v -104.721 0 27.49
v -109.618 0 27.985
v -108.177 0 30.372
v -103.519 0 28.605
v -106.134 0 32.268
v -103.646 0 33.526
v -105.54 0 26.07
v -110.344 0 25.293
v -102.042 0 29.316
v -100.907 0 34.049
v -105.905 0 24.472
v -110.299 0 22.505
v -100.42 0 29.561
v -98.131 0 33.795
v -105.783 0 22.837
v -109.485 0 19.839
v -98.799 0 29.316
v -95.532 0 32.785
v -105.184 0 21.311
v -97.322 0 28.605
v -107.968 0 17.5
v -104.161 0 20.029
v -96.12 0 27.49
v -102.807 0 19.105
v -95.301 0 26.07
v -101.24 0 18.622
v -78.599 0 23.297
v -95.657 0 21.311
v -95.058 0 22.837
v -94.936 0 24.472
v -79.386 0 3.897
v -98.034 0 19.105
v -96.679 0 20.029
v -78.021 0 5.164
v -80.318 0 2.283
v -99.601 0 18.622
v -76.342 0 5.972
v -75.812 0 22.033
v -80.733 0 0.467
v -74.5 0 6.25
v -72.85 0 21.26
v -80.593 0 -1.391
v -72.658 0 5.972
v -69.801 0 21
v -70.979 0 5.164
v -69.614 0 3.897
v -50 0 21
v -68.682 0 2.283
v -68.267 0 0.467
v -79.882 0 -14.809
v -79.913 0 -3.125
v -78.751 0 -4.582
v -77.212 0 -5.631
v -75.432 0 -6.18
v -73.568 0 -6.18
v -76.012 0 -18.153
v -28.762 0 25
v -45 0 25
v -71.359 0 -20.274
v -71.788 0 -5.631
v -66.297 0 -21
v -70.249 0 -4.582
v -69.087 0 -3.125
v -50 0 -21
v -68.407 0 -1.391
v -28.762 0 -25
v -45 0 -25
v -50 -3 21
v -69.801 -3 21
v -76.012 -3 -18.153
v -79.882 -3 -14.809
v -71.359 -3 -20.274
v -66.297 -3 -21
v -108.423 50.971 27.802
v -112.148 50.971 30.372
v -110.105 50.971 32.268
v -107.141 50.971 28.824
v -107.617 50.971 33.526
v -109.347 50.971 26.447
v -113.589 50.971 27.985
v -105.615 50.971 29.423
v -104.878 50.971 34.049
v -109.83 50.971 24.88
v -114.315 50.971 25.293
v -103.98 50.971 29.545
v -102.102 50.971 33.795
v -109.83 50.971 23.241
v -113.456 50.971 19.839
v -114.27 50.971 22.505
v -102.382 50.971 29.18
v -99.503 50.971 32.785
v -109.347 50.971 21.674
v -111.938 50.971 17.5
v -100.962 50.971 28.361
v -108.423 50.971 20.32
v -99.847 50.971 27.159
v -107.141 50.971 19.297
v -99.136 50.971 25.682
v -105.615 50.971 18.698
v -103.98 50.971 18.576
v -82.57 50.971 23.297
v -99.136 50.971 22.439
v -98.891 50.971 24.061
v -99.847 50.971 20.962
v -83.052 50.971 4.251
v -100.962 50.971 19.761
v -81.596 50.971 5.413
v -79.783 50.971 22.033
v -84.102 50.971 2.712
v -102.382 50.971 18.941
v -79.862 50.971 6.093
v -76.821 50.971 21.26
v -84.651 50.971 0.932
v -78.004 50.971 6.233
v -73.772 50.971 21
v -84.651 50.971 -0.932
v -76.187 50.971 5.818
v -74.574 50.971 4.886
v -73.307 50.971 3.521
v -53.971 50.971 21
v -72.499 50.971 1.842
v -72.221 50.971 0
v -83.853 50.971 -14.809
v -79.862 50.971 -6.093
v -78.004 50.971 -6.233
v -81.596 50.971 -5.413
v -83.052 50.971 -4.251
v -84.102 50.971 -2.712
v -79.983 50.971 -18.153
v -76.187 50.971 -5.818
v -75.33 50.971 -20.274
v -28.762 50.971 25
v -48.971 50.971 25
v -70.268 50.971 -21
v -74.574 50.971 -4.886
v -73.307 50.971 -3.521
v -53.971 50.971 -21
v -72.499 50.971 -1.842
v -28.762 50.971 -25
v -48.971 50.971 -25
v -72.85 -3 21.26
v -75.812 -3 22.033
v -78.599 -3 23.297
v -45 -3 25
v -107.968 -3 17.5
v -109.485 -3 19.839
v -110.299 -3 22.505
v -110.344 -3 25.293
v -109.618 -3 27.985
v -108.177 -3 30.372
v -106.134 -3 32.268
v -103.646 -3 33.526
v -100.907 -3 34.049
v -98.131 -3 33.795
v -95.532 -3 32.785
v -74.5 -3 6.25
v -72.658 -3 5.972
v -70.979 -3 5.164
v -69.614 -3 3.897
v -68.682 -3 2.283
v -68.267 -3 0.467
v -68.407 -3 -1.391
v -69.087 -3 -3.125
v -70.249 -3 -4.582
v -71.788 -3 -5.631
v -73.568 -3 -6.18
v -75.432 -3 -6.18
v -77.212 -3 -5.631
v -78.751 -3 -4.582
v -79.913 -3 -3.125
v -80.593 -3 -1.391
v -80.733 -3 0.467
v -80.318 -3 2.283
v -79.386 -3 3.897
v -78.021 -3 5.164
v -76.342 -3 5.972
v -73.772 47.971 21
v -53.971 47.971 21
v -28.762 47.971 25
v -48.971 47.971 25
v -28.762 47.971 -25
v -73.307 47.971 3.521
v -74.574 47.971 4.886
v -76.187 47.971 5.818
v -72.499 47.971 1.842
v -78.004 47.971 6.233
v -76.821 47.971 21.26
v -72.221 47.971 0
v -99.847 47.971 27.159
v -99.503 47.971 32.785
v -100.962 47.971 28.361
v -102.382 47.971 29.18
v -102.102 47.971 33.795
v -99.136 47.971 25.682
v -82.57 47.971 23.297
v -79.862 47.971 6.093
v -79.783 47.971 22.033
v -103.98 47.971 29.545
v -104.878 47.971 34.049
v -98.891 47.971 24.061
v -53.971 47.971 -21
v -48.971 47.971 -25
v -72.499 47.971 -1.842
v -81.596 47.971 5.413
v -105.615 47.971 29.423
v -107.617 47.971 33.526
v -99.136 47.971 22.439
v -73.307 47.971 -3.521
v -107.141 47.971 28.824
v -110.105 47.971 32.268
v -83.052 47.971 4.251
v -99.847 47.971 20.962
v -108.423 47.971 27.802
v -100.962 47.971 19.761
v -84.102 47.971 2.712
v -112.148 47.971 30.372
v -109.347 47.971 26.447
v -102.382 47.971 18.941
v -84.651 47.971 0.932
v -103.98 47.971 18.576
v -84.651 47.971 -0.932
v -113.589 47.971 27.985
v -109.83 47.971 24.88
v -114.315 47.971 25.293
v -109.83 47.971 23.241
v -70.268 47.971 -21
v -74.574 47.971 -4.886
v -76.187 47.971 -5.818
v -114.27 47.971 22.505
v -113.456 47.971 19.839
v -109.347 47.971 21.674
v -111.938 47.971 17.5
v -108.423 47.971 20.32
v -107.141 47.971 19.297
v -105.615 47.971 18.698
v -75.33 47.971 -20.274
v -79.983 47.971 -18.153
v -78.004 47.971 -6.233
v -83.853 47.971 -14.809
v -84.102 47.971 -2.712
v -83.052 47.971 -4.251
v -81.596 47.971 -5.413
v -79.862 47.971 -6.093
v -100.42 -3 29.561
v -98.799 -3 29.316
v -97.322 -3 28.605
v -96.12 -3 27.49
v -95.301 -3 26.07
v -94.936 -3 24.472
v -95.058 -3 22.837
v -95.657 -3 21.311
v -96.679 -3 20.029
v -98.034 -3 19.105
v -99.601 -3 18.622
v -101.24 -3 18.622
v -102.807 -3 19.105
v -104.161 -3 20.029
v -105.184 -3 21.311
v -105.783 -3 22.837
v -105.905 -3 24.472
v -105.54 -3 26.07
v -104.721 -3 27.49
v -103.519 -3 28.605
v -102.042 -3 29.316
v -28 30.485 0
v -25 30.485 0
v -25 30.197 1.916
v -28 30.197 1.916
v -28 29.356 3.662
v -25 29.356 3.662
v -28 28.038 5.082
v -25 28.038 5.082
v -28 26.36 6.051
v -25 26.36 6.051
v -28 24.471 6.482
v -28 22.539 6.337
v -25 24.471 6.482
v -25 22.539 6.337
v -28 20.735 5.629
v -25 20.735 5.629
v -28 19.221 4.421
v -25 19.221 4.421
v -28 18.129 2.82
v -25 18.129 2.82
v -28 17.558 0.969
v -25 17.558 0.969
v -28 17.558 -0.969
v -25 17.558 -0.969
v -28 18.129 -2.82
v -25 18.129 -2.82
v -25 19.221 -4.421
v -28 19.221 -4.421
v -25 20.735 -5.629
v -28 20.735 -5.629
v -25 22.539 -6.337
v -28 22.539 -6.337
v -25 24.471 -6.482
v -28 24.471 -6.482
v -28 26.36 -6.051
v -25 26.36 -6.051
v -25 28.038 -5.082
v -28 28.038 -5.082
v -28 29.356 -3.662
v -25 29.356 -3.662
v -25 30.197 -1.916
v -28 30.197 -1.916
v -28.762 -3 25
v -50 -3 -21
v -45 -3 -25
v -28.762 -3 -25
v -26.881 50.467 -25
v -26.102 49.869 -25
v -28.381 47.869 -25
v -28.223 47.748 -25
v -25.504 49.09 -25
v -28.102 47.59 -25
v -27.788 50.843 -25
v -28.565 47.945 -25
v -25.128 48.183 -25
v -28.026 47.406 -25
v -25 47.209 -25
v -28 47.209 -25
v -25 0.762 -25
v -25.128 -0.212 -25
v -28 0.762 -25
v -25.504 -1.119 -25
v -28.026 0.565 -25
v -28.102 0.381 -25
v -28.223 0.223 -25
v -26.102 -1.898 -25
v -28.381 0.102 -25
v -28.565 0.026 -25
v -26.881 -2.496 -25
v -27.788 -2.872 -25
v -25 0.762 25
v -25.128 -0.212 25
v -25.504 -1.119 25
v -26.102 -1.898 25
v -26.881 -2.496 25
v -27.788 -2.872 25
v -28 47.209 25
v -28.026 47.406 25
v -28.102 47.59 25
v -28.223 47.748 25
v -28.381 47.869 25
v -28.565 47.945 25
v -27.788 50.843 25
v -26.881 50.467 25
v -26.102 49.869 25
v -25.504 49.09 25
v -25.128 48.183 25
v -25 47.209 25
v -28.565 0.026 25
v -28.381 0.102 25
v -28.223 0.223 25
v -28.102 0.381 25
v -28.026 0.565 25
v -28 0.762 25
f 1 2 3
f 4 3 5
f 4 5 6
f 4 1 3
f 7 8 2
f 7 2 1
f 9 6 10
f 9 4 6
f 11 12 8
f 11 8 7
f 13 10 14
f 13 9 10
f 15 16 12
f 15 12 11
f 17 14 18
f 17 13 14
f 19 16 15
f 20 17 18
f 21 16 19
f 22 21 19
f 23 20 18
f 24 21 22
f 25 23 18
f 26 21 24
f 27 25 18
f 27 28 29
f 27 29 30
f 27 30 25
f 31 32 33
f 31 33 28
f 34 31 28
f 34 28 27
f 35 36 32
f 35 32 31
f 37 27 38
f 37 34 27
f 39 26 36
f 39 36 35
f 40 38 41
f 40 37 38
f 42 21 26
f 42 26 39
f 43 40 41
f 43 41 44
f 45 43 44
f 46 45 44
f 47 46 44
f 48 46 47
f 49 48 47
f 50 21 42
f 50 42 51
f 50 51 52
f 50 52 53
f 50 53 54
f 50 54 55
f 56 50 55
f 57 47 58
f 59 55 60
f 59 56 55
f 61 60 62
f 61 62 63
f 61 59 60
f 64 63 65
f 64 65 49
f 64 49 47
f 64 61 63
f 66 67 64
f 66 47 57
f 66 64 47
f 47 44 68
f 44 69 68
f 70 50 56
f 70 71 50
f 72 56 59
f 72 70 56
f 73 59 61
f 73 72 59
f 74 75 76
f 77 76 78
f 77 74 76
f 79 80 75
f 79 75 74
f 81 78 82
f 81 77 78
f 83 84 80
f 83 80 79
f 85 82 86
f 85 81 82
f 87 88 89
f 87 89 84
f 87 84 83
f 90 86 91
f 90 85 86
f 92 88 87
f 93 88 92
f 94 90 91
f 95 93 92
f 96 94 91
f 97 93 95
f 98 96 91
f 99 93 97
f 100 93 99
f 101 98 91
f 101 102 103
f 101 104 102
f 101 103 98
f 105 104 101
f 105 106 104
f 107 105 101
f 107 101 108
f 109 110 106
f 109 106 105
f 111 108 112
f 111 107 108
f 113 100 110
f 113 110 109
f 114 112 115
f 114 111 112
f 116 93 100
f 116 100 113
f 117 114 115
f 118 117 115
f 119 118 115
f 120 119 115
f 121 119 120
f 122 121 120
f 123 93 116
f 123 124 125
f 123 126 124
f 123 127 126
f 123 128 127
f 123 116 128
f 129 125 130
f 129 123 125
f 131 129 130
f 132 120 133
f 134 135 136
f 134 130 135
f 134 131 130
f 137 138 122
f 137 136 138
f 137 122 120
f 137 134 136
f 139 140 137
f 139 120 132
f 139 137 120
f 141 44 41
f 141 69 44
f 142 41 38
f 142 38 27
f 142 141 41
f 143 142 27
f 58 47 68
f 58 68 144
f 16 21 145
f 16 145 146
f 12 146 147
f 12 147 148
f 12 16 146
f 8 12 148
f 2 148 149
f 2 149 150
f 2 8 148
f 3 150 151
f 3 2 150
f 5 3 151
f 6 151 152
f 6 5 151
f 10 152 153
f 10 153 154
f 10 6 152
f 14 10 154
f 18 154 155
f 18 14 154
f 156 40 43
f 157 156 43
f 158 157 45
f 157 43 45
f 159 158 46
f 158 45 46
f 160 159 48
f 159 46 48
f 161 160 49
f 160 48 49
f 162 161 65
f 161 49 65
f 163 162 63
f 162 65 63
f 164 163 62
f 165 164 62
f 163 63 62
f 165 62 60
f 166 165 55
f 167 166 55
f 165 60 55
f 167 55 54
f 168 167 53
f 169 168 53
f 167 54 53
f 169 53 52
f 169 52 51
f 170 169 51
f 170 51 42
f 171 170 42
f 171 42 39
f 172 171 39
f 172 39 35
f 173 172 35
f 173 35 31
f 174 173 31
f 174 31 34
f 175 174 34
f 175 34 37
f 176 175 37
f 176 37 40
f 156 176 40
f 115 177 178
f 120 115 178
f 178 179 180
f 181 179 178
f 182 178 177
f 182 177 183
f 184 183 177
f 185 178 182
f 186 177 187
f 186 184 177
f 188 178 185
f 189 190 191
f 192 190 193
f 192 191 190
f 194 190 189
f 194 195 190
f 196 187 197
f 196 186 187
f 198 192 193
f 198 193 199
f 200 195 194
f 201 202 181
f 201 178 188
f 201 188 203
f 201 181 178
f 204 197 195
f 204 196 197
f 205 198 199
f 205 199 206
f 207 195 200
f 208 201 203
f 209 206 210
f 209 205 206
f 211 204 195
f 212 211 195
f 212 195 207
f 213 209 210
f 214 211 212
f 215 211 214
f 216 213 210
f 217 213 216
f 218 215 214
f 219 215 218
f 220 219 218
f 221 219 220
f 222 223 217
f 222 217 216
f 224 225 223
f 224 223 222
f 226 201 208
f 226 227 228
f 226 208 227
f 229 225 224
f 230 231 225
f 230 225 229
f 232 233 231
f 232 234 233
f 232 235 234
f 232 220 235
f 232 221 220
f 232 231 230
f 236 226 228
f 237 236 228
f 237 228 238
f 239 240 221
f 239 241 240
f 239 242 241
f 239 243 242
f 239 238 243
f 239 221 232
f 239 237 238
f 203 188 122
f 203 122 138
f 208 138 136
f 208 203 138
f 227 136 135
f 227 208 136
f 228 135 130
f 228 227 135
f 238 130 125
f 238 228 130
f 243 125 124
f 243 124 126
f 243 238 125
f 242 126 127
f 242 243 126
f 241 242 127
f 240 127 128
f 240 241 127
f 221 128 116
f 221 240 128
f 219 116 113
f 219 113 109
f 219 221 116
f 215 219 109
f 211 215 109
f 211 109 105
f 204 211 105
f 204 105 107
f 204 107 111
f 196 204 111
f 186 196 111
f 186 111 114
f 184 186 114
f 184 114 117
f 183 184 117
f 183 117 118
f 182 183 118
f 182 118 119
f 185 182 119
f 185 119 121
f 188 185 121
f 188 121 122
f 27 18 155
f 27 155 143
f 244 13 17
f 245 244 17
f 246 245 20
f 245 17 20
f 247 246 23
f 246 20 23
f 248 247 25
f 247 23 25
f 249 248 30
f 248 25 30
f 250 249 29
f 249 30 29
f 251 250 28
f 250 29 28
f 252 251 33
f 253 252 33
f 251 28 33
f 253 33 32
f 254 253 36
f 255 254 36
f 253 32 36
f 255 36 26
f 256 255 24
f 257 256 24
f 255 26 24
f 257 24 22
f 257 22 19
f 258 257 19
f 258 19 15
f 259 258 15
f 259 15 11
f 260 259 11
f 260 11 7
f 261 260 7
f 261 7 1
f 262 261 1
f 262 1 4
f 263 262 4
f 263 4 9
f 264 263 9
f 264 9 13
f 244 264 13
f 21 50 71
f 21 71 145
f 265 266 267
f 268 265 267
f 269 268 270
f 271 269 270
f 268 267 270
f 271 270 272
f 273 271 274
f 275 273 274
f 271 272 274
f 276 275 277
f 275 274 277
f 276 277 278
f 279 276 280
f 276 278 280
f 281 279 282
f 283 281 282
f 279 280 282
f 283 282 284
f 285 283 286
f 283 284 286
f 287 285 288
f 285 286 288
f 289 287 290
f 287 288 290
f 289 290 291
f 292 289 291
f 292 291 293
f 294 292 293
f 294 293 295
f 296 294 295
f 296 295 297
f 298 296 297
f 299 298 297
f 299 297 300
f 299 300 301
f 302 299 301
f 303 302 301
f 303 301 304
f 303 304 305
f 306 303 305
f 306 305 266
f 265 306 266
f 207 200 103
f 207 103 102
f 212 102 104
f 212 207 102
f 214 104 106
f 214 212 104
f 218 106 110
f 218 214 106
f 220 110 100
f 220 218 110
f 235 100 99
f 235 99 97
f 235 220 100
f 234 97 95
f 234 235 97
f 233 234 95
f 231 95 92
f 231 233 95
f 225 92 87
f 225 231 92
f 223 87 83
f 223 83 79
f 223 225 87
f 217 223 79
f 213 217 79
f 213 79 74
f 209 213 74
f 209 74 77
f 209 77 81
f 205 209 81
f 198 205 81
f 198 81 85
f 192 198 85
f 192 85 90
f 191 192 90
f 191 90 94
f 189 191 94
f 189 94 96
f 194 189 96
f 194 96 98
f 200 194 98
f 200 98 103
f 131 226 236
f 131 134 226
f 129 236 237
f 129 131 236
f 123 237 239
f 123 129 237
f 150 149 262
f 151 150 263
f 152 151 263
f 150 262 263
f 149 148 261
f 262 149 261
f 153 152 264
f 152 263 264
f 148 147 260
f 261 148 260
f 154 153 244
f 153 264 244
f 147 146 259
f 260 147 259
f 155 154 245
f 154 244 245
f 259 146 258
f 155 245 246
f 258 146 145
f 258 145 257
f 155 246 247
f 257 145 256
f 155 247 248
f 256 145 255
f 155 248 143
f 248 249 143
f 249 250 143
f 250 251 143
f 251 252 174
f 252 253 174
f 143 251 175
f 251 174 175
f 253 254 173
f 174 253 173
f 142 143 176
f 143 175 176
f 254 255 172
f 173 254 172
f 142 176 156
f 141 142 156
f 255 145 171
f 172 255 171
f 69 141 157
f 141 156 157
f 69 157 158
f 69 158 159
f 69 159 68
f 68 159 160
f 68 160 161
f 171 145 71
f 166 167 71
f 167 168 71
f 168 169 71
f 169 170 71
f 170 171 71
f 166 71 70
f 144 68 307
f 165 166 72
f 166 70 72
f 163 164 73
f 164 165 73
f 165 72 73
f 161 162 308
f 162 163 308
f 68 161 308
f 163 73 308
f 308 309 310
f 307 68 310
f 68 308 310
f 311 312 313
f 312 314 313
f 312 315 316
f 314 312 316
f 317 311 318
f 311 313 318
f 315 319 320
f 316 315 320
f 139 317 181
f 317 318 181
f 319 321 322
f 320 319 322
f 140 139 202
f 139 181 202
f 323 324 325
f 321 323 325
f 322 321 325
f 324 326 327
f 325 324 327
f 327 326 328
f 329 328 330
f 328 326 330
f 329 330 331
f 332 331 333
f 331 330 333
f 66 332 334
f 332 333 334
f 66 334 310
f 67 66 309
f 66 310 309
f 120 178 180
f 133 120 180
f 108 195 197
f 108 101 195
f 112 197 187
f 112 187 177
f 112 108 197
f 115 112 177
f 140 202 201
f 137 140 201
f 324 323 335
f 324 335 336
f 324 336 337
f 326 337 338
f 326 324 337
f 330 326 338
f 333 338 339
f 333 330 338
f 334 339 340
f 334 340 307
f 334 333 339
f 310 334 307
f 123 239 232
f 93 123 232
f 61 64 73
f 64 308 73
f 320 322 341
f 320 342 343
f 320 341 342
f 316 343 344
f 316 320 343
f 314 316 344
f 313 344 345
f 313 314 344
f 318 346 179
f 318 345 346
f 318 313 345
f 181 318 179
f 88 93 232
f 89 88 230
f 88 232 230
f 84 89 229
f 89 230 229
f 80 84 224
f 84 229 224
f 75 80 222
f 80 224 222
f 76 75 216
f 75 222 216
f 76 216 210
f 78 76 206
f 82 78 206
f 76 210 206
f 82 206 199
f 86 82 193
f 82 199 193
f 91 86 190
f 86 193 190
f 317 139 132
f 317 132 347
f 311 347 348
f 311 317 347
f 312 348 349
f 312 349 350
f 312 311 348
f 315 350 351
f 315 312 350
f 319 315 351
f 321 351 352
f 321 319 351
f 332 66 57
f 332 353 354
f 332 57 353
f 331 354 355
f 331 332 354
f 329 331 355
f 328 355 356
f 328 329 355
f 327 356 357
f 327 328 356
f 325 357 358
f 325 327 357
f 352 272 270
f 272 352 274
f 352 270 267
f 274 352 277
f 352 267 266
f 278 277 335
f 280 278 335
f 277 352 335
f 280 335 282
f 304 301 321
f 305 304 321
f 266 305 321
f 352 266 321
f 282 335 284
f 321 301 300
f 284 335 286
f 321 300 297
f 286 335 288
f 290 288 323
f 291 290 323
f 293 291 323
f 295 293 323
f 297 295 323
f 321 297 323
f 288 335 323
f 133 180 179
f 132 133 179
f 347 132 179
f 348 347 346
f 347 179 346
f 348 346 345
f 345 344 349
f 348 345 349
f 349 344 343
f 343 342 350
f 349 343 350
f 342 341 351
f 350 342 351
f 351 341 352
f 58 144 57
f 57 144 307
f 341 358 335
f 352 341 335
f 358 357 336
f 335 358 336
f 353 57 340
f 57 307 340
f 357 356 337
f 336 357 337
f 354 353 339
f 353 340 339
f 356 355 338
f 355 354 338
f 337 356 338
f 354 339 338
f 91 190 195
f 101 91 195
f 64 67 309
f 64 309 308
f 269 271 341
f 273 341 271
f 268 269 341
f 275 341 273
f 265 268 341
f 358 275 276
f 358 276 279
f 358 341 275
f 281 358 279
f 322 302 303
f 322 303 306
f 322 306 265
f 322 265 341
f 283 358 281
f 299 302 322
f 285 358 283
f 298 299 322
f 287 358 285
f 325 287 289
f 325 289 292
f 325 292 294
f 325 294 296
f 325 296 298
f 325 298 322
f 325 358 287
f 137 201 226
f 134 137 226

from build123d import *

# Parameters (mm, degrees)
SKETCH1_R                    = 5.5
SKETCH1_R_2                  = 6.25
BASE_FLANGE1_DEPTH           = 3
SKETCHED_START               = -3
SKETCHED_BEND1_OUTLINE_R     = 5.5
SKETCHED_BEND1_OUTLINE_R_2   = 6.25
SKETCHED_BEND1_DEPTH         = 3
SKETCHED_START_2             = 0.762
SKETCHED_BEND1_2_OUTLINE_W   = 3
SKETCHED_BEND1_2_OUTLINE_H   = 50
SKETCHED_BEND1_2_DEPTH       = 46.446858709
SKETCHED_START_3             = 47.208858709
SKETCHED_BEND1_3_OUTLINE_R   = 5.5
SKETCHED_BEND1_3_OUTLINE_R_2 = 6.25
SKETCHED_BEND1_3_DEPTH       = 3.762
SKETCHED_BEND1_4_OUTLINE_R   = 5.5
SKETCHED_BEND1_4_OUTLINE_R_2 = 6.25
SKETCHED_BEND1_4_DEPTH       = 0.762
SKETCHED_START_4             = -26
SKETCHED_BEND1_5_DEPTH       = 61
FILLET1_R                    = 18
SKETCH7_R                    = 6.5
CUT_EXTRUDE1_DEPTH           = 10


with BuildPart() as part:
    # Base-Flange1: sheet metal written as solids
    # Sketch1 → Base-Flange1 (new body)
    with BuildSketch(Plane(origin=(0, 0, 0), x_dir=(1, 0, 0), z_dir=(0, 1, 0))):
        with BuildLine():
            Line((45, 25), (-45, 25))
            Line((-45, 25), (-50, 21))
            Line((-50, 21), (-74.5, 21))
            Line((-74.5, 21), (-107.967539406, -17.5))
            ThreePointArc((-107.967539406, -17.5), (-108.177491125, -30.371550102), (-95.532395294, -32.784521956))
            Line((-95.532395294, -32.784521956), (-74.5, -21))
            Line((-74.5, -21), (-50, -21))
            Line((-50, -21), (-45, -25))
            Line((-45, -25), (45, -25))
            Line((45, -25), (50, -21))
            Line((50, -21), (74.5, -21))
            Line((74.5, -21), (95.532395294, -32.784521956))
            ThreePointArc((95.532395294, -32.784521956), (108.177491125, -30.371550102), (107.967539406, -17.5))
            Line((107.967539406, -17.5), (74.5, 21))
            Line((74.5, 21), (50, 21))
            Line((50, 21), (45, 25))
        make_face()
        with Locations(Location((-100.420443604, -24.06059029, 0), (0, 0, 270))):
            Circle(SKETCH1_R, mode=Mode.SUBTRACT)
        with Locations(Location((-74.5, 0, 0), (0, 0, 270))):
            Circle(SKETCH1_R_2, mode=Mode.SUBTRACT)
        with Locations(Location((74.5, 0, 0), (0, 0, 90))):
            Circle(SKETCH1_R_2, mode=Mode.SUBTRACT)
        with Locations(Location((100.420443604, -24.06059029, 0), (0, 0, 90))):
            Circle(SKETCH1_R, mode=Mode.SUBTRACT)
    extrude(amount=-BASE_FLANGE1_DEPTH)

    # Sketched Bend1: read off the stored shape, not the designer's step
    # Sketched Bend1 outline → Sketched Bend1 (cut)
    with BuildSketch(Plane(origin=(0, 0, 0), x_dir=(1, 0, 0), z_dir=(0, 1, 0)).offset(SKETCHED_START)):
        with BuildLine():
            Line((45, 25), (-25, 25))
            Line((-25, 25), (-25, -25))
            Line((-25, -25), (45, -25))
            Line((45, -25), (50, -21))
            Line((50, -21), (74.5, -21))
            Line((74.5, -21), (95.532395294, -32.784521956))
            ThreePointArc((95.532395294, -32.784521956), (108.177491125, -30.371550102), (107.967539406, -17.5))
            Line((107.967539406, -17.5), (74.5, 21))
            Line((74.5, 21), (50, 21))
            Line((50, 21), (45, 25))
        make_face()
        with Locations((100.420443604, -24.06059029)):
            Circle(SKETCHED_BEND1_OUTLINE_R, mode=Mode.SUBTRACT)
        with Locations((74.5, 0)):
            Circle(SKETCHED_BEND1_OUTLINE_R_2, mode=Mode.SUBTRACT)
    extrude(amount=SKETCHED_BEND1_DEPTH, mode=Mode.SUBTRACT)



with BuildPart() as body_2:
    # Sketched Bend1 2 outline → Sketched Bend1 2 (new body)
    with BuildSketch(Plane(origin=(0, 0, 0), x_dir=(1, 0, 0), z_dir=(0, 1, 0)).offset(SKETCHED_START_2)):
        with Locations((-26.5, 0)):
            Rectangle(SKETCHED_BEND1_2_OUTLINE_W, SKETCHED_BEND1_2_OUTLINE_H)
    extrude(amount=SKETCHED_BEND1_2_DEPTH)

    # Sketched Bend1 3 outline → Sketched Bend1 3 (add)
    with BuildSketch(Plane(origin=(0, 0, 0), x_dir=(1, 0, 0), z_dir=(0, 1, 0)).offset(SKETCHED_START_3)):
        with BuildLine():
            Line((-25, -25), (-25, 25))
            Line((-25, 25), (-48.970858709, 25))
            Line((-48.970858709, 25), (-53.970858709, 21))
            Line((-53.970858709, 21), (-78.470858709, 21))
            Line((-78.470858709, 21), (-111.938398115, -17.5))
            ThreePointArc((-111.938398115, -17.5), (-112.148349834, -30.371550102), (-99.503254003, -32.784521956))
            Line((-99.503254003, -32.784521956), (-78.470858709, -21))
            Line((-78.470858709, -21), (-53.970858709, -21))
            Line((-53.970858709, -21), (-48.970858709, -25))
            Line((-48.970858709, -25), (-25, -25))
        make_face()
        with Locations((-104.391302312, -24.06059029)):
            Circle(SKETCHED_BEND1_3_OUTLINE_R, mode=Mode.SUBTRACT)
        with Locations((-78.470858709, 0)):
            Circle(SKETCHED_BEND1_3_OUTLINE_R_2, mode=Mode.SUBTRACT)
    extrude(amount=SKETCHED_BEND1_3_DEPTH)


with BuildPart() as part_1:
    add(part.part)

    add(body_2.part)  # Sketched Bend1 4 merges body 2
    # Sketched Bend1 4 outline → Sketched Bend1 4 (add)
    with BuildSketch(Plane(origin=(0, 0, 0), x_dir=(1, 0, 0), z_dir=(0, 1, 0))):
        with BuildLine():
            Line((-25, -25), (-25, 25))
            Line((-25, 25), (-48.970858709, 25))
            Line((-48.970858709, 25), (-53.970858709, 21))
            Line((-53.970858709, 21), (-78.470858709, 21))
            Line((-78.470858709, 21), (-111.938398115, -17.5))
            ThreePointArc((-111.938398115, -17.5), (-112.148349834, -30.371550102), (-99.503254003, -32.784521956))
            Line((-99.503254003, -32.784521956), (-78.470858709, -21))
            Line((-78.470858709, -21), (-53.970858709, -21))
            Line((-53.970858709, -21), (-48.970858709, -25))
            Line((-48.970858709, -25), (-25, -25))
        make_face()
        with Locations((-104.391302312, -24.06059029)):
            Circle(SKETCHED_BEND1_4_OUTLINE_R, mode=Mode.SUBTRACT)
        with Locations((-78.470858709, 0)):
            Circle(SKETCHED_BEND1_4_OUTLINE_R_2, mode=Mode.SUBTRACT)
    extrude(amount=SKETCHED_BEND1_4_DEPTH)

    # Sketched Bend1 5 outline → Sketched Bend1 5 (cut)
    with BuildSketch(Plane.XY.offset(SKETCHED_START_4)):
        with BuildLine():
            ThreePointArc((-28.762, 50.970858709), (-26.101864289, 49.86899442), (-25, 47.208858709))
            Line((-25, 47.208858709), (-25.000000008, 52))
            Line((-25.000000008, 52), (-116, 52))
            Line((-116, 52), (-116, 50.970858695))
            Line((-116, 50.970858695), (-28.762, 50.970858709))
        make_face()
        with BuildLine():
            ThreePointArc((-25, 0.762), (-26.101864289, -1.898135711), (-28.762, -3))
            Line((-28.762, -3), (-116, -2.999999986))
            Line((-116, -2.999999986), (-116, -4))
            Line((-116, -4), (-25.000000008, -4))
            Line((-25.000000008, -4), (-25, 0.762))
        make_face()
        with BuildLine():
            Line((-28.762, 47.970858709), (-116, 47.970858709))
            Line((-116, 47.970858709), (-116, 47.208858709))
            Line((-116, 47.208858709), (-28, 47.208858709))
            ThreePointArc((-28, 47.208858709), (-28.223184633, 47.747674076), (-28.762, 47.970858709))
        make_face()
        with BuildLine():
            Line((-116, 0), (-28.762, 0))
            ThreePointArc((-28.762, 0), (-28.223184633, 0.223184633), (-28, 0.762))
            Line((-28, 0.762), (-116, 0.762))
            Line((-116, 0.762), (-116, 0))
        make_face()
    extrude(amount=SKETCHED_BEND1_5_DEPTH, mode=Mode.SUBTRACT)

    # Fillet1
    fillet1_edges = [part_1.edges().sort_by_distance(p)[0] for p in [
        (-78.470858709, 49.470858709, 21),
        (-78.470858709, 49.470858709, -21),
        (-74.5, -1.5, -21),
        (-74.5, -1.5, 21),
    ]]
    fillet(fillet1_edges, radius=FILLET1_R)

    # Sketch7 → Cut-Extrude1 (cut)
    with BuildSketch(Plane(origin=(-25, 0, 0), x_dir=(0, 0, -1), z_dir=(1, 0, 0))):
        with Locations(Location((0, 23.985429354, 0), (0, 0, 90))):
            Circle(SKETCH7_R)
    extrude(amount=-CUT_EXTRUDE1_DEPTH, mode=Mode.SUBTRACT)


solid = part_1.part
